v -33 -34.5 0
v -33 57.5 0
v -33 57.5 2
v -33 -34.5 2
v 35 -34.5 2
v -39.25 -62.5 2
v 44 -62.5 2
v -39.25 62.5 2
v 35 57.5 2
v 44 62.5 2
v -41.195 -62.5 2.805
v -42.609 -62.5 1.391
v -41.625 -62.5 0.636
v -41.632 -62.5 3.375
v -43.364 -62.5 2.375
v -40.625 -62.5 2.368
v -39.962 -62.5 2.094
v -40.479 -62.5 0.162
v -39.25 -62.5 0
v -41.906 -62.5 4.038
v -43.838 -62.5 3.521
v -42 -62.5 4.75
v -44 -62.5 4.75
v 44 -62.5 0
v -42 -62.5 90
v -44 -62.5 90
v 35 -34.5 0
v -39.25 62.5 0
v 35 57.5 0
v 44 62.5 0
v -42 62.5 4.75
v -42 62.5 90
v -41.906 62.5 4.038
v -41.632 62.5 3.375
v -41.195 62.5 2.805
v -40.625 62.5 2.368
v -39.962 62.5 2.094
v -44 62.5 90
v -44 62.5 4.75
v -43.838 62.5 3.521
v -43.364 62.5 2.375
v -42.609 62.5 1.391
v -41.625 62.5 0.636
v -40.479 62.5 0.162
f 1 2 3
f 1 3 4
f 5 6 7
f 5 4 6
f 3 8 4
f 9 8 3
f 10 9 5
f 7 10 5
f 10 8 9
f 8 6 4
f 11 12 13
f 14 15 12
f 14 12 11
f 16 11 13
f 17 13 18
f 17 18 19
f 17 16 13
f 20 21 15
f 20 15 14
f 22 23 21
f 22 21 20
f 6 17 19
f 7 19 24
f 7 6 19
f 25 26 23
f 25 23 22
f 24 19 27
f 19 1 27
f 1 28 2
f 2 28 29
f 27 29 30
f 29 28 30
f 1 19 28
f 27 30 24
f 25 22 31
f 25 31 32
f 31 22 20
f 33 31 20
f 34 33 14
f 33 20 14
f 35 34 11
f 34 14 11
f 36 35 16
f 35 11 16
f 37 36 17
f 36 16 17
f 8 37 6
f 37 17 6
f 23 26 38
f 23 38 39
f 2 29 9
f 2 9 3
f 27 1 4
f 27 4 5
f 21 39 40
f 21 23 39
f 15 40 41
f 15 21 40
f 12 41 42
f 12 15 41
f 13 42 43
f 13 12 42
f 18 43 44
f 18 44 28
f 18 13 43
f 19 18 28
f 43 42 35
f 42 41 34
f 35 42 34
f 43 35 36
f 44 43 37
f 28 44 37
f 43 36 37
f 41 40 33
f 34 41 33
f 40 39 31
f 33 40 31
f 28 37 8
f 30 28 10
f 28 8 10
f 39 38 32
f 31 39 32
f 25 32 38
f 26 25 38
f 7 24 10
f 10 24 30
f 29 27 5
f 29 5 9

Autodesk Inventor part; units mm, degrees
ref_plane "YZ Plane" through (0, 0, 0) normal (1, 0, 0) x (0, 1, 0)
ref_plane "XZ Plane" through (0, 0, 0) normal (0, 1, 0) x (-1, 0, 0)
ref_plane "XY Plane" through (0, 0, 0) normal (0, 0, 1) x (1, 0, 0)
sketch "Sketch1" plane through (0, 0, 0) normal (0, 0, 1) x (1, 0, 0)
  line L0 (-44, -62.5) -> (44, -62.5)
  line L1 (44, -62.5) -> (44, 62.5)
  line L2 (44, 62.5) -> (-44, 62.5)
  line L3 (-44, 62.5) -> (-44, -62.5)
  line L4 (-44, -62.5) -> (44, 62.5) construction
  line L5 (44, -62.5) -> (-44, 62.5) construction
  line L6 (35, 57.5) -> (-33, 57.5)
  line L7 (-33, 57.5) -> (-33, -34.5)
  line L8 (-33, -34.5) -> (35, -34.5)
  line L9 (35, -34.5) -> (35, 57.5)
  point P0 (0, 0)
  dimension "d154" = 88
  dimension "d155" = 125
  dimension "d185" = 68
  dimension "d186" = 92
  dimension "d187" = 11
  dimension "d188" = 9
  dimension "d190" = 5
extrude "Plate5" add sketch "Sketch1" along normal blind 2
sketch "Sketch7" plane through (-42, -62.5, 0) normal (-1, 0, 0) x (0, -1, 0)
  line L0 (-125, 0) -> (0, 0)
  line L1 (0, 0) -> (0, 90)
  line L2 (0, 90) -> (-125, 90)
  line L3 (-125, 90) -> (-125, 0)
edge flange "Flange3" height 90 angle 90 thickness 2 bend radius 2.75 thickness toward (-1, 0, 0) relief round relief width 2 relief depth 1 edges at (-44, 0, 2) wall of the first edge with corners at (-42, 62.5, 0) (-42, -62.5, 0) (-42, -62.5, 90) (-42, 62.5, 90)
bend "Bend3"
corner "Corner3"
sketch "Sketch9" plane through (-44, -62.5, 90) normal (-1, 0, 0) x (0, 0, 1)
  line L0 (-27.375, 69.75) -> (-57.875, 69.75)
  line L1 (-57.875, 69.75) -> (-57.875, 100.25)
  line L2 (-57.875, 100.25) -> (-27.375, 100.25)
  line L3 (-27.375, 100.25) -> (-27.375, 69.75)
  line L4 (-27.375, 69.75) -> (-57.875, 100.25) construction
  line L5 (-57.875, 69.75) -> (-27.375, 100.25) construction
  circle A0 centre (-19.625, 62) radius 2.5
  circle A1 centre (-65.625, 62) radius 2.5
  circle A2 centre (-65.625, 108) radius 2.5
  circle A3 centre (-19.625, 108) radius 2.5
  circle A4 centre (-42.625, 85) radius 32.5269 construction
  line L6 (-57.875, 69.75) -> (-65.625, 62) construction
  line L7 (-17.125, 59.5) -> (-68.125, 59.5) construction
  line L8 (-68.125, 59.5) -> (-68.125, 110.5) construction
  line L9 (-68.125, 110.5) -> (-17.125, 110.5) construction
  line L10 (-17.125, 110.5) -> (-17.125, 59.5) construction
  line L11 (-17.125, 59.5) -> (-68.125, 110.5) construction
  line L12 (-68.125, 59.5) -> (-17.125, 110.5) construction
  line L13 (-85.25, 125) -> (0, 125) projected
  line L14 (-42.625, 125) -> (-42.625, 85) construction
  circle A5 centre (-65.625, 108) radius 10.9602 construction
  line L15 (-19.625, 62) -> (-65.625, 62) construction
  line L16 (-65.625, 62) -> (-65.625, 108) construction
  line L17 (-65.625, 108) -> (-19.625, 108) construction
  line L18 (-19.625, 108) -> (-19.625, 62) construction
  line L19 (-19.625, 62) -> (-65.625, 108) construction
  line L20 (-65.625, 62) -> (-19.625, 108) construction
  point P0 (-90, 62.5)
  point P1 (-104.8197, 150.8767)
  point P2 (-104.8197, 150.8767)
  dimension "d181" = 21.9203
  dimension "d174" = 30.5
  dimension "d175" = 30.5
  dimension "d176" = 5
  dimension "d179" = 40
  dimension "d180" = 51
  dimension "d184" = 46
cut "Cut2" [suppressed]
properties part number "PRS 1652 DrSysB Central tube wall_D1200" material "Stainless Steel"
